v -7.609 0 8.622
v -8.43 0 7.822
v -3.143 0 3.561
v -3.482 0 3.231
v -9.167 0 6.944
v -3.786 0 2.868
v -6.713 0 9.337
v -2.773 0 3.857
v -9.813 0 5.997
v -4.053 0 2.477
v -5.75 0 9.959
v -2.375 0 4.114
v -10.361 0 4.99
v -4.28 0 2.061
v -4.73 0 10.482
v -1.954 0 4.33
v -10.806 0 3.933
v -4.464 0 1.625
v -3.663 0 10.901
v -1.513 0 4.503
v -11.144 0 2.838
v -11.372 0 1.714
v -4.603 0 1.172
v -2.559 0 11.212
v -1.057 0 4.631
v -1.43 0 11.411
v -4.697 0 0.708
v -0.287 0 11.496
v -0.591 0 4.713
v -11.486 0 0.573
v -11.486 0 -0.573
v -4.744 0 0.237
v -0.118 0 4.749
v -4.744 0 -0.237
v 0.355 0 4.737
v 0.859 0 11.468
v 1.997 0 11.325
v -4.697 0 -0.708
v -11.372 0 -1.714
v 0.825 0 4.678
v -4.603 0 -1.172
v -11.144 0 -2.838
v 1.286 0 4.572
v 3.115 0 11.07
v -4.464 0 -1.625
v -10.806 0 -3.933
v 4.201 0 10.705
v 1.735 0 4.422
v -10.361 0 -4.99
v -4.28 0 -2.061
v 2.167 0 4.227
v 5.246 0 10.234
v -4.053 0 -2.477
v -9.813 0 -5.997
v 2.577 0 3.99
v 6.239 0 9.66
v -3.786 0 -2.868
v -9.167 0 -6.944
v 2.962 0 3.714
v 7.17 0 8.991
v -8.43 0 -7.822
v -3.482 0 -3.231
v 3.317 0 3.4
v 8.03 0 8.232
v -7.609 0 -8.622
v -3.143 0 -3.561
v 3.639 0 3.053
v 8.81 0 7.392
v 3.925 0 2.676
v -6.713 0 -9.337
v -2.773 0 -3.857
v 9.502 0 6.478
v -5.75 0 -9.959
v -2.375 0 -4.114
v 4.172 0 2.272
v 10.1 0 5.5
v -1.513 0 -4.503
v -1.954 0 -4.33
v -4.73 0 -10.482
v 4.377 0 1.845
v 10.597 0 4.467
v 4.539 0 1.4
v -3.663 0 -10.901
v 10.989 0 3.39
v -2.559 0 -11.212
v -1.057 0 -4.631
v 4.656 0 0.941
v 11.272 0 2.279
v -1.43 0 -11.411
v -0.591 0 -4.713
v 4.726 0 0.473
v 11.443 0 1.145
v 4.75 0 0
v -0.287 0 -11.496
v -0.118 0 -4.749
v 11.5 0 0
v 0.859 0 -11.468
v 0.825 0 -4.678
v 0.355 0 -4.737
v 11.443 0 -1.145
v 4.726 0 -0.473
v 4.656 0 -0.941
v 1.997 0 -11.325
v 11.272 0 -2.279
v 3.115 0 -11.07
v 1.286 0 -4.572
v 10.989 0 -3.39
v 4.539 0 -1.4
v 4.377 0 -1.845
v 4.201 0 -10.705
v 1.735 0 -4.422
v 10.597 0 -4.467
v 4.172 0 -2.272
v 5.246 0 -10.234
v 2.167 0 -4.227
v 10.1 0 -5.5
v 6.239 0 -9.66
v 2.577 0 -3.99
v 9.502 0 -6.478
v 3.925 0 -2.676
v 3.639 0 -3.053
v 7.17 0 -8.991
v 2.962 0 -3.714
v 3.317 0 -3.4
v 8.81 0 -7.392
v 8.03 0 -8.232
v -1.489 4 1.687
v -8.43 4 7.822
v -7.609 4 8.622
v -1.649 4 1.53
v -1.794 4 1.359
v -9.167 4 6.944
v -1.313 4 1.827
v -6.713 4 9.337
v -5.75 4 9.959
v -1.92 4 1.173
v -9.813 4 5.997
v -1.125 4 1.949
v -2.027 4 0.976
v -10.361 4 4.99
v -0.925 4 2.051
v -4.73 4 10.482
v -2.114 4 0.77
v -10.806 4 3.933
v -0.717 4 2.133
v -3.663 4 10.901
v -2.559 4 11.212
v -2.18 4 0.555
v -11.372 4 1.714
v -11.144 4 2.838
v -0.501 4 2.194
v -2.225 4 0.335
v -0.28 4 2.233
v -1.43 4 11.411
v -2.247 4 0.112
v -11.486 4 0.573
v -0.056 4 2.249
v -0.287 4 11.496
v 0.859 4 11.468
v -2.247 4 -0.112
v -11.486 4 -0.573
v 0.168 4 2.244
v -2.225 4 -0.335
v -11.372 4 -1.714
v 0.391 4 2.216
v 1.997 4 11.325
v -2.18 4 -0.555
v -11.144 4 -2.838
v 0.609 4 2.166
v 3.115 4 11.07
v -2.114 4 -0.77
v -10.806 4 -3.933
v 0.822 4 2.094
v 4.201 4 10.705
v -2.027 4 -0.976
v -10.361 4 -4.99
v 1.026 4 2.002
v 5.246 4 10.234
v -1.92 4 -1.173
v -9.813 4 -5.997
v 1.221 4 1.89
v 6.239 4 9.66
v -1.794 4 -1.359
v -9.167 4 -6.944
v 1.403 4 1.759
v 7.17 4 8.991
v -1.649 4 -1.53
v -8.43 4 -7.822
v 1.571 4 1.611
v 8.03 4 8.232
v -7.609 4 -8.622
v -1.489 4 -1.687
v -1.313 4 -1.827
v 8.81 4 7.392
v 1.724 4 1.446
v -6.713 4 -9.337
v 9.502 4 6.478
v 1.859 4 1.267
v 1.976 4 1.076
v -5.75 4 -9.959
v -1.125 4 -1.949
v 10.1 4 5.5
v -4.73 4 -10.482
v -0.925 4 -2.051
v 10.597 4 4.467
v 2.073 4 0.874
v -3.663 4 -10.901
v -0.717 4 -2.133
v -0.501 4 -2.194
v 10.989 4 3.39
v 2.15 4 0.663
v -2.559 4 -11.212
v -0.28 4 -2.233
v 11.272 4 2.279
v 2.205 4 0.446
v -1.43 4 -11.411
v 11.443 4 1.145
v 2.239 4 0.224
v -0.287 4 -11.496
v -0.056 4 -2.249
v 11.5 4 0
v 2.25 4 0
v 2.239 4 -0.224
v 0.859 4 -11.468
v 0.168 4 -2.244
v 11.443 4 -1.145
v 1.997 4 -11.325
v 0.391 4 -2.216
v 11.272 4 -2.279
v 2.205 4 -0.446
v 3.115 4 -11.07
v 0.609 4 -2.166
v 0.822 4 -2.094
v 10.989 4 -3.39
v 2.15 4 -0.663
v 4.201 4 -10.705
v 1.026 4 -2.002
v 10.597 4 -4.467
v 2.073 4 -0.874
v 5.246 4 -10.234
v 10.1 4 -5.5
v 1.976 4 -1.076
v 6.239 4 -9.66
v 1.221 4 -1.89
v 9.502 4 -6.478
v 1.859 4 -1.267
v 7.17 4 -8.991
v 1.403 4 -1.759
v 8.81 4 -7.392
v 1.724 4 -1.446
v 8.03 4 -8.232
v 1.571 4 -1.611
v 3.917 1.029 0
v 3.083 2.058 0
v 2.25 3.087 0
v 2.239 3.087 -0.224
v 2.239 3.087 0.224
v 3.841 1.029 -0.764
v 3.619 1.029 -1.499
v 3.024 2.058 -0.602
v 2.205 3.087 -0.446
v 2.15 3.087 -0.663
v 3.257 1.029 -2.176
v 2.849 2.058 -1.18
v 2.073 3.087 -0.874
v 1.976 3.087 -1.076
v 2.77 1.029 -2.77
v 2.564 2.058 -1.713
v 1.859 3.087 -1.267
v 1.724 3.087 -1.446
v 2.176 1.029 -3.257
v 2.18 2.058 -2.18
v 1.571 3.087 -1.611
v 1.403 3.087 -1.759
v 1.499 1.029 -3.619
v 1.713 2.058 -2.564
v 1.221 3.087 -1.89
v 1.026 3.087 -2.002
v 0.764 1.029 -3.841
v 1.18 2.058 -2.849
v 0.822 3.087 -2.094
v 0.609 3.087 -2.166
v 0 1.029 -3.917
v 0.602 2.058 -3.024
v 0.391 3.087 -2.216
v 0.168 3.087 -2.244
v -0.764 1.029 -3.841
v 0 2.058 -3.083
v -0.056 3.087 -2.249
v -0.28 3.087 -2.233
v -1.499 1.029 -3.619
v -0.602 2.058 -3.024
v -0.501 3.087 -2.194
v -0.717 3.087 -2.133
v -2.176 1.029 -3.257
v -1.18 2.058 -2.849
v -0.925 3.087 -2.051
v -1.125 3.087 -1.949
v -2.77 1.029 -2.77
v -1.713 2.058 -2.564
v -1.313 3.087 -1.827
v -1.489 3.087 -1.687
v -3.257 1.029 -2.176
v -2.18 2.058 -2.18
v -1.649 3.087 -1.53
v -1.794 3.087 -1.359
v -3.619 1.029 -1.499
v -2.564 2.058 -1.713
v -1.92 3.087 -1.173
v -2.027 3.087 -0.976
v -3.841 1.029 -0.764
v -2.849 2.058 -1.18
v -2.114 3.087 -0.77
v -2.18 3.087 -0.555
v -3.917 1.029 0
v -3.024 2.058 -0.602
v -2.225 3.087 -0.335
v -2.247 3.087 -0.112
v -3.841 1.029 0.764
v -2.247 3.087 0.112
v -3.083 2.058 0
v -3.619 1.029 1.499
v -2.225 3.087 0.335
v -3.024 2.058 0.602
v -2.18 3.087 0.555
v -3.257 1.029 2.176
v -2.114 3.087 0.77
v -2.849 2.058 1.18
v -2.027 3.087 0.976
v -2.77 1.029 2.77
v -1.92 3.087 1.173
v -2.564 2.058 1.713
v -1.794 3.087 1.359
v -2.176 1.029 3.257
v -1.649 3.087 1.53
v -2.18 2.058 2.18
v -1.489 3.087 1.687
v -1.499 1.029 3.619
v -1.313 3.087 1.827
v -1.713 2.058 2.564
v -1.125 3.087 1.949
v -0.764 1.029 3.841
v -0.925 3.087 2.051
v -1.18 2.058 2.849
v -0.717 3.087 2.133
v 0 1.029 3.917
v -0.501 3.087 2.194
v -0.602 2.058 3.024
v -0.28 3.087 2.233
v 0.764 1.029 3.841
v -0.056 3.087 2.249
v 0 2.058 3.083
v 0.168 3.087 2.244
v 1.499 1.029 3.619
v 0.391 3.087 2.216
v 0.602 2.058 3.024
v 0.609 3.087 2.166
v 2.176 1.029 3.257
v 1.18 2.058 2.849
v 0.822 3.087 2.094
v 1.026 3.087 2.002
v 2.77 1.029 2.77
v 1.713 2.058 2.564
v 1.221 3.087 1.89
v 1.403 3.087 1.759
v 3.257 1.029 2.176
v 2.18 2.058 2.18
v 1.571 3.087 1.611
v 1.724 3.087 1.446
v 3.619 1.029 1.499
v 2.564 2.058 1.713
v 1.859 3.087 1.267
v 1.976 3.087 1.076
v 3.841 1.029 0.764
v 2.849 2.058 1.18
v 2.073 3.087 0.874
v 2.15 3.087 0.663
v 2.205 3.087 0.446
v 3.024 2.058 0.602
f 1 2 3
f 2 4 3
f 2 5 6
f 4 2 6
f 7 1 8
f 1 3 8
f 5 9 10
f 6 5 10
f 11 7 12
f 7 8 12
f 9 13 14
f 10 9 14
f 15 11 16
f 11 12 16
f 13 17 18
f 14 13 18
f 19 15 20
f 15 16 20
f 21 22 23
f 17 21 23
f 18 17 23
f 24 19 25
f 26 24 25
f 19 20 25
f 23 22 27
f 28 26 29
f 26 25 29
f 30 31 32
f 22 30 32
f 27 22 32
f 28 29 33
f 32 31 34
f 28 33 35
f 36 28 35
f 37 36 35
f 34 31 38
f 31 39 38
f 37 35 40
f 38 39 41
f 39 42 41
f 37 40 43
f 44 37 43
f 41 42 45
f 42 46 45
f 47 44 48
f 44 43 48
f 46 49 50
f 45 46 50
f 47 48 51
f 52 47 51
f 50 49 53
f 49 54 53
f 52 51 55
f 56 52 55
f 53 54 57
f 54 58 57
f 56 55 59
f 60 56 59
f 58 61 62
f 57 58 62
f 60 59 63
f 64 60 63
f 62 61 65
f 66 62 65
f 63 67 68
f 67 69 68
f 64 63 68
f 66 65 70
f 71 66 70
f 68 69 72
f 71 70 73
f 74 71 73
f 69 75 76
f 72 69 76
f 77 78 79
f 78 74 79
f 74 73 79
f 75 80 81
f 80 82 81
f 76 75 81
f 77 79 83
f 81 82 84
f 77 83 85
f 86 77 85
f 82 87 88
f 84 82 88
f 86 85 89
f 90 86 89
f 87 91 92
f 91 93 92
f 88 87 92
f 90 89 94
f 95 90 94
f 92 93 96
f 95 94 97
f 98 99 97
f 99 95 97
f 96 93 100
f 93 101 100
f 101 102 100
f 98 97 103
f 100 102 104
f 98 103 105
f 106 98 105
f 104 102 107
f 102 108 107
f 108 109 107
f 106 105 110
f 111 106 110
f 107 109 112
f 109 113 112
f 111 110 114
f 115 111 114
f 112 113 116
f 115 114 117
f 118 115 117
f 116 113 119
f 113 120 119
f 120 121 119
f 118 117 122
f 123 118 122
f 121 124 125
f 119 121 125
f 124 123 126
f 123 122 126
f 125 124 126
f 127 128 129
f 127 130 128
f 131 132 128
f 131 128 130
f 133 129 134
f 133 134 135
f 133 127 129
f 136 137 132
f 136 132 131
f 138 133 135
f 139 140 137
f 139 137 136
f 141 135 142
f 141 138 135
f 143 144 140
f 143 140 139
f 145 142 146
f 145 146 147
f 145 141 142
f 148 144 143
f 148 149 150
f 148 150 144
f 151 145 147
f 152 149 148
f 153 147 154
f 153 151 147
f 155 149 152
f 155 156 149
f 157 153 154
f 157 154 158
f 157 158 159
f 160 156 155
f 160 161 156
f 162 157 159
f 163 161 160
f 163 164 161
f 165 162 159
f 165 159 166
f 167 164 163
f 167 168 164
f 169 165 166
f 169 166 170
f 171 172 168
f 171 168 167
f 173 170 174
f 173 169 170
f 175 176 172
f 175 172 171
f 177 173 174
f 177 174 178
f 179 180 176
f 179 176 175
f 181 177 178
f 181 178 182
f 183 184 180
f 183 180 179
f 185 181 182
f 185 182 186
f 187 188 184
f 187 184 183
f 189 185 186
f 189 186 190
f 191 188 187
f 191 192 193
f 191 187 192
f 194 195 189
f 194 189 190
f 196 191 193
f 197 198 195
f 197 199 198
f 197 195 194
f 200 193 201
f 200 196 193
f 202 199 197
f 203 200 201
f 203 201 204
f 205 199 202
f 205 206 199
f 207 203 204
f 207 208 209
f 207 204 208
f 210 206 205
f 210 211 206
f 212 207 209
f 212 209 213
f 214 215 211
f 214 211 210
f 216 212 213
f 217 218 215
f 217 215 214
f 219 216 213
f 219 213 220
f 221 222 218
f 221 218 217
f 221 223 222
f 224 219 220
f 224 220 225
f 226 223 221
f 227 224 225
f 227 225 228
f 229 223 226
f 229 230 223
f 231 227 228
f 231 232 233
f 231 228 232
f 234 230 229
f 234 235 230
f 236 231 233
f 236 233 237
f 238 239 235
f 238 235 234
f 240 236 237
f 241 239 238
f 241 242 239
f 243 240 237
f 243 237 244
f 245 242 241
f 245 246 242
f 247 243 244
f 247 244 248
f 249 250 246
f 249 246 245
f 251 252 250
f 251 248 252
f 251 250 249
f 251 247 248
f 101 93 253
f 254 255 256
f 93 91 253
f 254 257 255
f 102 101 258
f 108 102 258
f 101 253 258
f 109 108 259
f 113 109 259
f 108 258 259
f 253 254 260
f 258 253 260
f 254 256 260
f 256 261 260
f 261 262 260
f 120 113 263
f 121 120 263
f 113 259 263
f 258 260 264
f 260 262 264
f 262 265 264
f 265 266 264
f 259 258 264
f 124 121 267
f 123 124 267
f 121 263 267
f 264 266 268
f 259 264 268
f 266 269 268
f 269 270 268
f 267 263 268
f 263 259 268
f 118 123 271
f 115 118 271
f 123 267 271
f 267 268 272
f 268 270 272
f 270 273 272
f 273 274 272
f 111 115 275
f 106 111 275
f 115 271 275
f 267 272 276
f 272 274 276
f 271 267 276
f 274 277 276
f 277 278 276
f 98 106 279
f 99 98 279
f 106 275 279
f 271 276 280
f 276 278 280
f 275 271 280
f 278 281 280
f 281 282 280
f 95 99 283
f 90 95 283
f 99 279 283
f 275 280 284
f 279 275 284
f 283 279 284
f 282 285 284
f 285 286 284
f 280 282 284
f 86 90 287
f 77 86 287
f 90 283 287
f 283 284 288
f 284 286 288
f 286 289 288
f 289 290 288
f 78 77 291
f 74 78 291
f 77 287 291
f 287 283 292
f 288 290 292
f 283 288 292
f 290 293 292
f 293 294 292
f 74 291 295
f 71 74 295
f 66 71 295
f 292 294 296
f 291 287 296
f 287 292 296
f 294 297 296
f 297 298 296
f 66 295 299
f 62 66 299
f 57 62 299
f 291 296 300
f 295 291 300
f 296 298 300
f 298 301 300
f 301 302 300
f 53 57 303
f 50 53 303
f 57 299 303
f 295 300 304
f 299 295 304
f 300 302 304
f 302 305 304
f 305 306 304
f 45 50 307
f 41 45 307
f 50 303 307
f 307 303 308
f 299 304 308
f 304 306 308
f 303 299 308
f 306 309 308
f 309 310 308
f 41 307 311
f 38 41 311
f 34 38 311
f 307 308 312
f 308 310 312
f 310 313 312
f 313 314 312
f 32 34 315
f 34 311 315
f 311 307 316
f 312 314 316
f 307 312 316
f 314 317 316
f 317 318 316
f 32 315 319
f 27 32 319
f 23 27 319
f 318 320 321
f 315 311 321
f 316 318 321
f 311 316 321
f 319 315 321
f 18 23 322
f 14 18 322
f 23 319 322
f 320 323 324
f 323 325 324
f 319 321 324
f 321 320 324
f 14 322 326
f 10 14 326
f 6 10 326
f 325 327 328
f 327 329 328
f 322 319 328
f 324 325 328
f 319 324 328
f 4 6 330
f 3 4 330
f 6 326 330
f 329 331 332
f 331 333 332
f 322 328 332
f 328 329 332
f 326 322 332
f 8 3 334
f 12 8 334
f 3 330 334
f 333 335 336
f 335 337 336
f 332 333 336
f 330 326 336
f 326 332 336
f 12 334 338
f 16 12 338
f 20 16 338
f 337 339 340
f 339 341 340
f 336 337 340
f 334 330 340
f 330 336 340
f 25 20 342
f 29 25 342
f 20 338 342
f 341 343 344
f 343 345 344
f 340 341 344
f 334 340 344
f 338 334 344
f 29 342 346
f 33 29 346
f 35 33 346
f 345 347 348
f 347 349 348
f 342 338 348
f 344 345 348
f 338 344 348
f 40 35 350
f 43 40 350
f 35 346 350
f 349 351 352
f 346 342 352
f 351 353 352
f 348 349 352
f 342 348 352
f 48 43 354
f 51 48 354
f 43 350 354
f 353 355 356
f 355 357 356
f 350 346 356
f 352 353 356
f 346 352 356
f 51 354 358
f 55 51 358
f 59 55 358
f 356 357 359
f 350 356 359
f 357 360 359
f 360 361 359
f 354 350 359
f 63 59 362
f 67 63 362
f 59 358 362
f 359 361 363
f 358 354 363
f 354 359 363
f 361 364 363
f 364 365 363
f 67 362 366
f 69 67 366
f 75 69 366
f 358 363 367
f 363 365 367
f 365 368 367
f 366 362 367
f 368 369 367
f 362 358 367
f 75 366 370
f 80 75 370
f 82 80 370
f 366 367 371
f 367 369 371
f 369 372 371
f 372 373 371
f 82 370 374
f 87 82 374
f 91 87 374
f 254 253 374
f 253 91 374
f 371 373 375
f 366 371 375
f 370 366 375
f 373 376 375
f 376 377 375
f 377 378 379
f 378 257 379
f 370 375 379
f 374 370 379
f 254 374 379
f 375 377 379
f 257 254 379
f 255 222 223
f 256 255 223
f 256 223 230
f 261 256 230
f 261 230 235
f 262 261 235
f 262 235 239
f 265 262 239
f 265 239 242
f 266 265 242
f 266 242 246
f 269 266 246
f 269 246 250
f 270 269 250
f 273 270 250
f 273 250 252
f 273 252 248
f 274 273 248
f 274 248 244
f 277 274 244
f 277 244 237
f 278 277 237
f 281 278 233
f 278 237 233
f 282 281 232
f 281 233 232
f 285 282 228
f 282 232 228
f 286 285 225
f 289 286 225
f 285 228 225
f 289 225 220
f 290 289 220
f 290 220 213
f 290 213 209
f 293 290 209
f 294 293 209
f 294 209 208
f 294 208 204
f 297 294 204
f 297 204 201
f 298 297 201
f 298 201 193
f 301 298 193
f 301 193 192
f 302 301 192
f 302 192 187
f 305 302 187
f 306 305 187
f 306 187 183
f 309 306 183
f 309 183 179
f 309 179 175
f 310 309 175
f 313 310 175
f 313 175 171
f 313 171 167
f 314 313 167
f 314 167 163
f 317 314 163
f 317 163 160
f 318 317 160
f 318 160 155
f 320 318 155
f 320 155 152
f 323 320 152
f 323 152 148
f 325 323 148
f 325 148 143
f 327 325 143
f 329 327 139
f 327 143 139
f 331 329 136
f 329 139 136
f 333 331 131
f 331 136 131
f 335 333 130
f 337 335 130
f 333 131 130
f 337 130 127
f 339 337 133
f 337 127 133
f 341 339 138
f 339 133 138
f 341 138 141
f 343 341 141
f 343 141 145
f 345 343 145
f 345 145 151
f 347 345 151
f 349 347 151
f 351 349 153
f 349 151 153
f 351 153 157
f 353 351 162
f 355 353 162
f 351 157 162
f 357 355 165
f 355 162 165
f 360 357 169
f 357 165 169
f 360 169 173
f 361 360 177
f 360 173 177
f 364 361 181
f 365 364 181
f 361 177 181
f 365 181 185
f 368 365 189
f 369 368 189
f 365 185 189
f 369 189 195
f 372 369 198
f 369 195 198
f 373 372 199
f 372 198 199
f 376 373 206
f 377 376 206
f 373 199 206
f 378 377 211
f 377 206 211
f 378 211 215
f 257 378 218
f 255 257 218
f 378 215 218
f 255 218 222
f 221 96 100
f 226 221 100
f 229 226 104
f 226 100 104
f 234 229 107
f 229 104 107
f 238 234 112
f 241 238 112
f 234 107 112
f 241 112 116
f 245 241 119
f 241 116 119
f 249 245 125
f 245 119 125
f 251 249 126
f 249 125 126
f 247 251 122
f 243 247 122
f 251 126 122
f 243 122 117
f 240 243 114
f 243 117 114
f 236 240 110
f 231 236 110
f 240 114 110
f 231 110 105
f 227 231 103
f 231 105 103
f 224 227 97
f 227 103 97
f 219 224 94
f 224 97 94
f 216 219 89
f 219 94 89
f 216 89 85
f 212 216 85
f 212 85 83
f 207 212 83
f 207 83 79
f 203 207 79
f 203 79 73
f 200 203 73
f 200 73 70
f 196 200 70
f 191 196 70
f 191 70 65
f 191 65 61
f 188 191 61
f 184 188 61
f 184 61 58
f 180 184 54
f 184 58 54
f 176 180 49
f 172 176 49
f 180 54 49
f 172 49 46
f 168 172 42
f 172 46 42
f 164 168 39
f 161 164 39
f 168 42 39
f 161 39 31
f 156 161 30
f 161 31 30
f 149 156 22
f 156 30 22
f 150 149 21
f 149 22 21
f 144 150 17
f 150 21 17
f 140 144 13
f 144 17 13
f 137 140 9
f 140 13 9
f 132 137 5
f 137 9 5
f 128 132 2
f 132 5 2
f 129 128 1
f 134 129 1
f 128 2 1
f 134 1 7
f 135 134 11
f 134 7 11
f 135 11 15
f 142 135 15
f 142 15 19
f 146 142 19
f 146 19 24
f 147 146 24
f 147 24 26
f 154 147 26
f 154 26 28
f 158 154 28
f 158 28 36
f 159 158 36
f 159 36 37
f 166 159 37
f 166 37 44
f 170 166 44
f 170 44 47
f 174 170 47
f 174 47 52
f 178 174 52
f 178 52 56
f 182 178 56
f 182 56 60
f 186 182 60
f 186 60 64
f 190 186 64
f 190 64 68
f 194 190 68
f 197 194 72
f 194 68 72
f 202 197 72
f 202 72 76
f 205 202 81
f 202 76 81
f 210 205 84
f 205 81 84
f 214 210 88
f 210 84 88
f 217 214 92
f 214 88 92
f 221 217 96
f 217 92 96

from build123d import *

# Parameters (mm, degrees)
SKETCH1_R           = 11.5
BOSS_EXTRUDE1_DEPTH = 4
SKETCH2_R           = 2.25
CUT_EXTRUDE1_DEPTH  = 5
CHAMFER1_SIZE       = 2.5
CHAMFER1_SIZE2      = 3.087242891


with BuildPart() as part:
    # Sketch1 → Boss-Extrude1 (new body)
    with BuildSketch(Plane(origin=(0, 0, 0), x_dir=(1, 0, 0), z_dir=(0, 1, 0))):
        Circle(SKETCH1_R)
    extrude(amount=BOSS_EXTRUDE1_DEPTH)

    # Sketch2 → Cut-Extrude1 (cut, through all)
    with BuildSketch(Plane(origin=(0, 4, 0), x_dir=(1, 0, 0), z_dir=(0, 1, 0))):
        Circle(SKETCH2_R)
    extrude(amount=-CUT_EXTRUDE1_DEPTH, mode=Mode.SUBTRACT)

    # Chamfer1
    chamfer1_edges = [part.edges().sort_by_distance(p)[0] for p in [
        (-2.25, 0, 0),
    ]]
    chamfer1_side = [part.faces().sort_by_distance(p)[0] for p in [
        (-11.174730881, 0, 0),
    ]]
    chamfer(chamfer1_edges, length=CHAMFER1_SIZE, length2=CHAMFER1_SIZE2, reference=chamfer1_side[0])


solid = part.part
